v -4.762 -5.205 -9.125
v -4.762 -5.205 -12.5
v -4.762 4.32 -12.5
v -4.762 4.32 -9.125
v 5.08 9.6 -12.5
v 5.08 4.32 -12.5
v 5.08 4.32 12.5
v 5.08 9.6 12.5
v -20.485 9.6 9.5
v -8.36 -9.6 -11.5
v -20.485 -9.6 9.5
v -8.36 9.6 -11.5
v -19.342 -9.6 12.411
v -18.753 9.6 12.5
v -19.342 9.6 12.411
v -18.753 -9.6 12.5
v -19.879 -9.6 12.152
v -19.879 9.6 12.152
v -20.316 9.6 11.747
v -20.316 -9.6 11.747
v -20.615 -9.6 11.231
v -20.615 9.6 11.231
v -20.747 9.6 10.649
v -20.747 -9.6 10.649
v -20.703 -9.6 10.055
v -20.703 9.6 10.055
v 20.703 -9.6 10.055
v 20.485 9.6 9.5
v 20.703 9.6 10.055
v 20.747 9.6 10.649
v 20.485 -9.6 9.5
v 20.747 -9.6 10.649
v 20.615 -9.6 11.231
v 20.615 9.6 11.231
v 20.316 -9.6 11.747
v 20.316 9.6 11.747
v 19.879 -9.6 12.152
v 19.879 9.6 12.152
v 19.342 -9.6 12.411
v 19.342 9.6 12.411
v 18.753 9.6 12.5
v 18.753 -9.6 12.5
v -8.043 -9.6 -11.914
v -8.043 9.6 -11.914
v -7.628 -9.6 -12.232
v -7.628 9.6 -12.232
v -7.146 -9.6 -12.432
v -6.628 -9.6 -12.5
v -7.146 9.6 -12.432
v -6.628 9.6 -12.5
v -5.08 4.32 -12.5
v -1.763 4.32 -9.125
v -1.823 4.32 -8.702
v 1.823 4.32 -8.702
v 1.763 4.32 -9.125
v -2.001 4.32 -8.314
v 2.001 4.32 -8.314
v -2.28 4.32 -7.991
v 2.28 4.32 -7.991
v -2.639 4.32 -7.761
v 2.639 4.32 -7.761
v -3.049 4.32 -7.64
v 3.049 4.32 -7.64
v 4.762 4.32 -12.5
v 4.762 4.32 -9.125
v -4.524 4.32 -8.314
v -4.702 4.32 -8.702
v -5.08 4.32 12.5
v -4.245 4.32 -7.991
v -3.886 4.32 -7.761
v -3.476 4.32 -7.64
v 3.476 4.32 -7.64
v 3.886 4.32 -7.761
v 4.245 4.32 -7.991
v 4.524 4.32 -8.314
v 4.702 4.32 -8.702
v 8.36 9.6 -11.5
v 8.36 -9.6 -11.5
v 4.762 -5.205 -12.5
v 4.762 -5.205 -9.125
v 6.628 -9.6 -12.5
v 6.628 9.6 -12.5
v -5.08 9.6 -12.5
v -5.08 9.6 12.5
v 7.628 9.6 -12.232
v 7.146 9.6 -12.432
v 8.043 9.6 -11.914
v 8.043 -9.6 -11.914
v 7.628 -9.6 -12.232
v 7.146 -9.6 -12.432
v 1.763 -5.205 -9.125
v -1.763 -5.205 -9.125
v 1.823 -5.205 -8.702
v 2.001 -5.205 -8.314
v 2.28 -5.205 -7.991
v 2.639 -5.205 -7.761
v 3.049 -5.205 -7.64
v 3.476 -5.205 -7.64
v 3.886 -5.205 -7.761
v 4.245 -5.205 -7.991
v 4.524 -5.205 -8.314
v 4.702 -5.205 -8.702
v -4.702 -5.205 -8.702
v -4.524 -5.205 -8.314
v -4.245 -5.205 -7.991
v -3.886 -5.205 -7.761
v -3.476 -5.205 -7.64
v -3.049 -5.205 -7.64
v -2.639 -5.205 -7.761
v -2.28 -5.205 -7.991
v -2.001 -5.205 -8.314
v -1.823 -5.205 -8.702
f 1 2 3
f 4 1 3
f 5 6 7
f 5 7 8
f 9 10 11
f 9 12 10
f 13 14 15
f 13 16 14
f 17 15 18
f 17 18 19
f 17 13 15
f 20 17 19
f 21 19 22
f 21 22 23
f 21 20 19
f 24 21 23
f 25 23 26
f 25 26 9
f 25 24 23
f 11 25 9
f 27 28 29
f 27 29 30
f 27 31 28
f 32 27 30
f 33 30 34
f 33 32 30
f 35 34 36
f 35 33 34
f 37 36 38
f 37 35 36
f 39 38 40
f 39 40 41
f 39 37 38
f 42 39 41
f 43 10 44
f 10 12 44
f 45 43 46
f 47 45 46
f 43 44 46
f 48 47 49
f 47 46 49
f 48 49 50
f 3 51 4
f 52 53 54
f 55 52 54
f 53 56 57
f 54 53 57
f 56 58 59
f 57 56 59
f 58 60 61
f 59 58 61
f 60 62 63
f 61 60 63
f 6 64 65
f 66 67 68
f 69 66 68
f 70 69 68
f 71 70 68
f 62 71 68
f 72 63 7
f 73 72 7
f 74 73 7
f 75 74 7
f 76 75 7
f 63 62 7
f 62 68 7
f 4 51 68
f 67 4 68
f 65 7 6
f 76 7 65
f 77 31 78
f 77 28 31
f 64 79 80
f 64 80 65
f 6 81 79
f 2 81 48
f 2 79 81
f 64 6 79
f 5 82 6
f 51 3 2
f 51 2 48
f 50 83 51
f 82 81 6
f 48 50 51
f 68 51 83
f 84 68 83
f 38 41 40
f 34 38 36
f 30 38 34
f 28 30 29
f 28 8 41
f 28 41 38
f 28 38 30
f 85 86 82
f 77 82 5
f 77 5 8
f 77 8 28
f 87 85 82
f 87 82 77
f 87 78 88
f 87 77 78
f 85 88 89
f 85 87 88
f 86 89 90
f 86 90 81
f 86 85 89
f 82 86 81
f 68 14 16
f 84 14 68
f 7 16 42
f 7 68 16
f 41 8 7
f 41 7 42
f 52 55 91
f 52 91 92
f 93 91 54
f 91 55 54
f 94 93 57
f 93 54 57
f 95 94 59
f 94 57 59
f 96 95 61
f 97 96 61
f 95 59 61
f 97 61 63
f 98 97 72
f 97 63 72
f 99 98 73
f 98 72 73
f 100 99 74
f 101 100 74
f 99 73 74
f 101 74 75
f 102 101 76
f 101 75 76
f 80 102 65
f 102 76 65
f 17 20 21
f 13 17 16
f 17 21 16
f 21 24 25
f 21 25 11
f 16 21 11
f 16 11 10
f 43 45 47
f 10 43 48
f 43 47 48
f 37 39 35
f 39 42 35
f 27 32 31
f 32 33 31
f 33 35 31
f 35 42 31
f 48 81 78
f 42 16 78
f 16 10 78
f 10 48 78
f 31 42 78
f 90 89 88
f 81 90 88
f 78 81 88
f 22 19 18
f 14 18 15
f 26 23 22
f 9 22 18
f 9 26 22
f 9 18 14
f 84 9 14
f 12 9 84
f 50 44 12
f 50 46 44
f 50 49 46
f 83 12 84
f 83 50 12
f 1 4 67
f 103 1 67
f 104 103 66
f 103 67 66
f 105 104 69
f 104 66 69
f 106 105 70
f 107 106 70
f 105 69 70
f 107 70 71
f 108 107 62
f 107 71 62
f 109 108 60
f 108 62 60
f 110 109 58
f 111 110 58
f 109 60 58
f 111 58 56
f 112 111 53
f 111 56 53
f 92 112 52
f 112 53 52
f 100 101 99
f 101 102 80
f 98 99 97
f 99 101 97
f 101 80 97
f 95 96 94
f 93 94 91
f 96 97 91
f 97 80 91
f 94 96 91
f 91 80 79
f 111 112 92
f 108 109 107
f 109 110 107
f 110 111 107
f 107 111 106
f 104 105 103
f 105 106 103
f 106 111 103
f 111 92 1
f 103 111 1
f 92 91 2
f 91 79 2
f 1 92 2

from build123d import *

# Parameters (mm, degrees)
BOSS_EXTRUDE1_DEPTH = 9.6
FILLET5_R           = 2
SKETCH7_W           = 10.16
SKETCH7_H           = 5.28
CUT_EXTRUDE6_DEPTH  = 34.879754173
SKETCH11_W          = 9.525
SKETCH11_H          = 9.525
CUT_EXTRUDE9_DEPTH  = 3.375
SKETCH12_R          = 1.5
CUT_EXTRUDE10_DEPTH = 9.525


with BuildPart() as part:
    # Sketch1 → Boss-Extrude1 (new, symmetric)
    with BuildSketch(Plane(origin=(0, 0, 0), x_dir=(1, 0, 0), z_dir=(0, 1, 0))):
        Polygon((-14.297771125, -12.5), (14.297771125, -12.5), (22.216878365, -12.5), (7.783121635, 12.5), (-7.783121635, 12.5), (-22.216878365, -12.5), align=None)
    extrude(amount=BOSS_EXTRUDE1_DEPTH, both=True)

    # Fillet5
    fillet5_edges = [part.edges().sort_by_distance(p)[0] for p in [
        (-22.216878365, 0, 12.5),
        (-7.783121635, 0, -12.5),
        (7.783121635, 0, -12.5),
        (22.216878365, 0, 12.5),
    ]]
    fillet(fillet5_edges, radius=FILLET5_R)

    # Sketch7 → Cut-Extrude6 (cut, through all)
    with BuildSketch(Plane.XY.offset(12.5)):
        with Locations((0, 6.96)):
            Rectangle(SKETCH7_W, SKETCH7_H)
    extrude(amount=-CUT_EXTRUDE6_DEPTH, mode=Mode.SUBTRACT)

    # Sketch11 → Cut-Extrude9 (cut)
    with BuildSketch(Plane(origin=(0, 0, -12.5), x_dir=(-1, 0, 0), z_dir=(0, 0, -1))):
        with Locations((0, -0.4425)):
            Rectangle(SKETCH11_W, SKETCH11_H)
    extrude(amount=-CUT_EXTRUDE9_DEPTH, mode=Mode.SUBTRACT)

    # Sketch12 → Cut-Extrude10 (cut)
    with BuildSketch(Plane(origin=(0, 4.32, 0), x_dir=(1, 0, 0), z_dir=(0, 1, 0))):
        with Locations((3.2625, 9.125)):
            Circle(SKETCH12_R)
        with Locations((-3.2625, 9.125)):
            Circle(SKETCH12_R)
    extrude(amount=-CUT_EXTRUDE10_DEPTH, mode=Mode.SUBTRACT)


solid = part.part
